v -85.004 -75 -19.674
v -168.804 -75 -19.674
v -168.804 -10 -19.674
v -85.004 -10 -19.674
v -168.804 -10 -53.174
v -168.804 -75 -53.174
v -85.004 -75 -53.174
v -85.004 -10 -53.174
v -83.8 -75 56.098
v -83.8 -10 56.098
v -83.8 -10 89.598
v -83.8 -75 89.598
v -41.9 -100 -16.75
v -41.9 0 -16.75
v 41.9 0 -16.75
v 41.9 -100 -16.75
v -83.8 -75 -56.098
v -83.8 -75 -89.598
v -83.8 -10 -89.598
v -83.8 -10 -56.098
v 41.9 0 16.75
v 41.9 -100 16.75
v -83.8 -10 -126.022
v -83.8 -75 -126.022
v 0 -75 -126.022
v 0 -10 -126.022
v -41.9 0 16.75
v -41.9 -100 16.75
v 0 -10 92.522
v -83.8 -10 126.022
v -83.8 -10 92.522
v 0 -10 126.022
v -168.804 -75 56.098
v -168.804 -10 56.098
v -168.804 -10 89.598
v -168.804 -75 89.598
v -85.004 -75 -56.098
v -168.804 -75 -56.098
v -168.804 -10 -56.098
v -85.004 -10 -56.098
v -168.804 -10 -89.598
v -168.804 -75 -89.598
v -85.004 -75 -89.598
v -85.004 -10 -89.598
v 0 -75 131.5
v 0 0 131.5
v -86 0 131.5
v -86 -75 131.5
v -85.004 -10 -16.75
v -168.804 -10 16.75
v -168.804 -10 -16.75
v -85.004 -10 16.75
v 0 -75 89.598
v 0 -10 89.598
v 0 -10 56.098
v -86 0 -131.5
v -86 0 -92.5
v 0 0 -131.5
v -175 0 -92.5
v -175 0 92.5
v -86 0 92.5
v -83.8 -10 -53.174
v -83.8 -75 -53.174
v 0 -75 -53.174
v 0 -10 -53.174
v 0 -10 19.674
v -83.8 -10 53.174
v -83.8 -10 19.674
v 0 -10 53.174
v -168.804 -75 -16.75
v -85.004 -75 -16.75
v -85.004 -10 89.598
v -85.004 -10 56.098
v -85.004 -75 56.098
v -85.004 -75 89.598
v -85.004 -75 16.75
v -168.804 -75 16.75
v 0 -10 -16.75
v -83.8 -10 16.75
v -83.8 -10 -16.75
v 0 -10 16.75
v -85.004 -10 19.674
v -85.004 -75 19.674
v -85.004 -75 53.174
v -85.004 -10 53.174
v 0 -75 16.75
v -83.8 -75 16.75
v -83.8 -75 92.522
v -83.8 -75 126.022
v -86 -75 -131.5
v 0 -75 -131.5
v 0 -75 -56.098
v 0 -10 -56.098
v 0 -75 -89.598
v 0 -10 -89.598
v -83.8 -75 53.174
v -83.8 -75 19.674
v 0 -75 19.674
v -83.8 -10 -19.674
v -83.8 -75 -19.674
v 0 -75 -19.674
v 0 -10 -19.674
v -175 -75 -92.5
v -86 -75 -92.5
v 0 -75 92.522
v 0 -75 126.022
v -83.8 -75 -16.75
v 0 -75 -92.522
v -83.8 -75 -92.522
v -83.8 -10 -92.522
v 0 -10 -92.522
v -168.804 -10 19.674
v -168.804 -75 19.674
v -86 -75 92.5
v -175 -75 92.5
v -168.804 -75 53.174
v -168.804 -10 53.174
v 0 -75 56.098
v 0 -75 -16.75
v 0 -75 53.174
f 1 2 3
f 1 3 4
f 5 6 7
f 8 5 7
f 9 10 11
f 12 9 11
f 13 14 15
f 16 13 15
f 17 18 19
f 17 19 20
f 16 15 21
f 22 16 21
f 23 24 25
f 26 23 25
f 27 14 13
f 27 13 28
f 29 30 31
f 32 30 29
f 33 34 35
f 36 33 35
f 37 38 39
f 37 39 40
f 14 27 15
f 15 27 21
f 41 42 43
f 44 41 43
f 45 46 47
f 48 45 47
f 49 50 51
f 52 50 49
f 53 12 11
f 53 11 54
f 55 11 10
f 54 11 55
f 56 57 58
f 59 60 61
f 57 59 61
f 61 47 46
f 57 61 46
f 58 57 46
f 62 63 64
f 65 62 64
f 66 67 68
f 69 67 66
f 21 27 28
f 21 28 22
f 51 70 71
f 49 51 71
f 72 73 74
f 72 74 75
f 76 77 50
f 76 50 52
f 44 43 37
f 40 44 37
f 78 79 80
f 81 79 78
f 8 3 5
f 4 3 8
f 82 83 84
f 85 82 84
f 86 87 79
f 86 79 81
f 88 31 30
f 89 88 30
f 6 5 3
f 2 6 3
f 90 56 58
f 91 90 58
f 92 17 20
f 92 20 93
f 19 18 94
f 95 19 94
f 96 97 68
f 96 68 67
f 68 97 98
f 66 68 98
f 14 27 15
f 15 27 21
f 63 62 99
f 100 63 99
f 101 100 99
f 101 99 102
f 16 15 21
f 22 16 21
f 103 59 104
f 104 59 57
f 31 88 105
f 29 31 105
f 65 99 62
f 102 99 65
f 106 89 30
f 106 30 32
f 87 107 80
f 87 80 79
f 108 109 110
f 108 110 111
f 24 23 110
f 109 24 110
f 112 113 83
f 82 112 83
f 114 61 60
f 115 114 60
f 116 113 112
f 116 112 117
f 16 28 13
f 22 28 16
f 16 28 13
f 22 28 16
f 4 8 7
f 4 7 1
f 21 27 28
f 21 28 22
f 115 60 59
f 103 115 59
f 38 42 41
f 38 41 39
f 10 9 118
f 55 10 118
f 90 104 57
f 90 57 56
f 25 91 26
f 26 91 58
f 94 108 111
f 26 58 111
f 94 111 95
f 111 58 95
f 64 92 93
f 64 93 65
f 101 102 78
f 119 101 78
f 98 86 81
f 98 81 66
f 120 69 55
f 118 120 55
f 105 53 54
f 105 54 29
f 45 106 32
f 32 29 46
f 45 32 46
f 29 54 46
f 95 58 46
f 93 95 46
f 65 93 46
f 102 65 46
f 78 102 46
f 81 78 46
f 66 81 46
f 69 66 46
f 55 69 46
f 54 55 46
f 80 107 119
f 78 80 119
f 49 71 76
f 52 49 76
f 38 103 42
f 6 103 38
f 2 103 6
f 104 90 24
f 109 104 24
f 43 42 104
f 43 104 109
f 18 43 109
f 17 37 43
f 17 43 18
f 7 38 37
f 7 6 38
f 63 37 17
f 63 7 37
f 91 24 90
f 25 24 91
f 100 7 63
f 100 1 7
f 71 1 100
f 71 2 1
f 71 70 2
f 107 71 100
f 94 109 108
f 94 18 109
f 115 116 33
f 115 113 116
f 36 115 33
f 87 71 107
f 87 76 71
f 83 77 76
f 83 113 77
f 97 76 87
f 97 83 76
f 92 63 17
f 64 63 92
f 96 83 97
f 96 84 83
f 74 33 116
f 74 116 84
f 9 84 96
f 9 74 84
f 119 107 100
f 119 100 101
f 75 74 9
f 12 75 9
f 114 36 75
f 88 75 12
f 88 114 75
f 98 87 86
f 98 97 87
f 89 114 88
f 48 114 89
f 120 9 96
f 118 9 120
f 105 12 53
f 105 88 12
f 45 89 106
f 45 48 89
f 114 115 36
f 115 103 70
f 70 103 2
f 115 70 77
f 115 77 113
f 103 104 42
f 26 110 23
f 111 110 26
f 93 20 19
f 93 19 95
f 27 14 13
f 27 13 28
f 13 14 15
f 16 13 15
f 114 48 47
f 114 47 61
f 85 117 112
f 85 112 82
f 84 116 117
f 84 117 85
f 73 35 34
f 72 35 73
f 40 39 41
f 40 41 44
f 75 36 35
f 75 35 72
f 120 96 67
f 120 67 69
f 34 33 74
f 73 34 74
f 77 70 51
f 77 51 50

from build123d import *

# Parameters (mm, degrees)
F1_DEPTH = 75
F2_W     = 83.8
F2_H     = 33.5
F3_DEPTH = 65
F4_W     = 83.8
F4_H     = 33.5
F5_DEPTH = 100
F6_DEPTH = 100


with BuildPart() as f1:
    # F0 (on Front) → F1 (new body)
    with BuildSketch(Plane.XZ):
        Polygon((0, 0), (0, 131.5), (-86, 131.5), (-86, 92.5), (-175, 92.5), (-175, 0), (-175, -92.5), (-86, -92.5), (-86, -131.5), (0, -131.5), align=None)
    extrude(amount=F1_DEPTH)

    # F2 (on face) → F3 (cut)
    with BuildSketch(Plane.XZ.offset(75)):
        with Locations((-41.9, 109.272)):
            Rectangle(F2_W, F2_H)
        with Locations((-126.904, 72.848)):
            Rectangle(F2_W, F2_H)
        with Locations((-41.9, 72.848)):
            Rectangle(F2_W, F2_H)
        with Locations((-126.904, 36.424)):
            Rectangle(F2_W, F2_H)
        with Locations((-41.9, 36.424)):
            Rectangle(F2_W, F2_H)
        with Locations((-126.904, 0)):
            Rectangle(F2_W, F2_H)
        with Locations((-41.9, 0)):
            Rectangle(F2_W, F2_H)
        with Locations((-126.904, -36.424)):
            Rectangle(F2_W, F2_H)
        with Locations((-41.9, -36.424)):
            Rectangle(F2_W, F2_H)
        with Locations((-126.904, -72.848)):
            Rectangle(F2_W, F2_H)
        with Locations((-41.9, -72.848)):
            Rectangle(F2_W, F2_H)
        with Locations((-41.9, -109.272)):
            Rectangle(F2_W, F2_H)
    extrude(amount=-F3_DEPTH, mode=Mode.SUBTRACT)


with BuildPart() as f5:
    # F4 (on Front) → F5 (new body)
    with BuildSketch(Plane.XZ):
        Rectangle(F4_W, F4_H)
    extrude(amount=F5_DEPTH)


with BuildPart() as f6:
    # F4 (on Front) → F6 (new body)
    with BuildSketch(Plane.XZ):
        Rectangle(F4_W, F4_H)
    extrude(amount=F6_DEPTH)


solid = Compound([f1.part, f5.part, f6.part])
